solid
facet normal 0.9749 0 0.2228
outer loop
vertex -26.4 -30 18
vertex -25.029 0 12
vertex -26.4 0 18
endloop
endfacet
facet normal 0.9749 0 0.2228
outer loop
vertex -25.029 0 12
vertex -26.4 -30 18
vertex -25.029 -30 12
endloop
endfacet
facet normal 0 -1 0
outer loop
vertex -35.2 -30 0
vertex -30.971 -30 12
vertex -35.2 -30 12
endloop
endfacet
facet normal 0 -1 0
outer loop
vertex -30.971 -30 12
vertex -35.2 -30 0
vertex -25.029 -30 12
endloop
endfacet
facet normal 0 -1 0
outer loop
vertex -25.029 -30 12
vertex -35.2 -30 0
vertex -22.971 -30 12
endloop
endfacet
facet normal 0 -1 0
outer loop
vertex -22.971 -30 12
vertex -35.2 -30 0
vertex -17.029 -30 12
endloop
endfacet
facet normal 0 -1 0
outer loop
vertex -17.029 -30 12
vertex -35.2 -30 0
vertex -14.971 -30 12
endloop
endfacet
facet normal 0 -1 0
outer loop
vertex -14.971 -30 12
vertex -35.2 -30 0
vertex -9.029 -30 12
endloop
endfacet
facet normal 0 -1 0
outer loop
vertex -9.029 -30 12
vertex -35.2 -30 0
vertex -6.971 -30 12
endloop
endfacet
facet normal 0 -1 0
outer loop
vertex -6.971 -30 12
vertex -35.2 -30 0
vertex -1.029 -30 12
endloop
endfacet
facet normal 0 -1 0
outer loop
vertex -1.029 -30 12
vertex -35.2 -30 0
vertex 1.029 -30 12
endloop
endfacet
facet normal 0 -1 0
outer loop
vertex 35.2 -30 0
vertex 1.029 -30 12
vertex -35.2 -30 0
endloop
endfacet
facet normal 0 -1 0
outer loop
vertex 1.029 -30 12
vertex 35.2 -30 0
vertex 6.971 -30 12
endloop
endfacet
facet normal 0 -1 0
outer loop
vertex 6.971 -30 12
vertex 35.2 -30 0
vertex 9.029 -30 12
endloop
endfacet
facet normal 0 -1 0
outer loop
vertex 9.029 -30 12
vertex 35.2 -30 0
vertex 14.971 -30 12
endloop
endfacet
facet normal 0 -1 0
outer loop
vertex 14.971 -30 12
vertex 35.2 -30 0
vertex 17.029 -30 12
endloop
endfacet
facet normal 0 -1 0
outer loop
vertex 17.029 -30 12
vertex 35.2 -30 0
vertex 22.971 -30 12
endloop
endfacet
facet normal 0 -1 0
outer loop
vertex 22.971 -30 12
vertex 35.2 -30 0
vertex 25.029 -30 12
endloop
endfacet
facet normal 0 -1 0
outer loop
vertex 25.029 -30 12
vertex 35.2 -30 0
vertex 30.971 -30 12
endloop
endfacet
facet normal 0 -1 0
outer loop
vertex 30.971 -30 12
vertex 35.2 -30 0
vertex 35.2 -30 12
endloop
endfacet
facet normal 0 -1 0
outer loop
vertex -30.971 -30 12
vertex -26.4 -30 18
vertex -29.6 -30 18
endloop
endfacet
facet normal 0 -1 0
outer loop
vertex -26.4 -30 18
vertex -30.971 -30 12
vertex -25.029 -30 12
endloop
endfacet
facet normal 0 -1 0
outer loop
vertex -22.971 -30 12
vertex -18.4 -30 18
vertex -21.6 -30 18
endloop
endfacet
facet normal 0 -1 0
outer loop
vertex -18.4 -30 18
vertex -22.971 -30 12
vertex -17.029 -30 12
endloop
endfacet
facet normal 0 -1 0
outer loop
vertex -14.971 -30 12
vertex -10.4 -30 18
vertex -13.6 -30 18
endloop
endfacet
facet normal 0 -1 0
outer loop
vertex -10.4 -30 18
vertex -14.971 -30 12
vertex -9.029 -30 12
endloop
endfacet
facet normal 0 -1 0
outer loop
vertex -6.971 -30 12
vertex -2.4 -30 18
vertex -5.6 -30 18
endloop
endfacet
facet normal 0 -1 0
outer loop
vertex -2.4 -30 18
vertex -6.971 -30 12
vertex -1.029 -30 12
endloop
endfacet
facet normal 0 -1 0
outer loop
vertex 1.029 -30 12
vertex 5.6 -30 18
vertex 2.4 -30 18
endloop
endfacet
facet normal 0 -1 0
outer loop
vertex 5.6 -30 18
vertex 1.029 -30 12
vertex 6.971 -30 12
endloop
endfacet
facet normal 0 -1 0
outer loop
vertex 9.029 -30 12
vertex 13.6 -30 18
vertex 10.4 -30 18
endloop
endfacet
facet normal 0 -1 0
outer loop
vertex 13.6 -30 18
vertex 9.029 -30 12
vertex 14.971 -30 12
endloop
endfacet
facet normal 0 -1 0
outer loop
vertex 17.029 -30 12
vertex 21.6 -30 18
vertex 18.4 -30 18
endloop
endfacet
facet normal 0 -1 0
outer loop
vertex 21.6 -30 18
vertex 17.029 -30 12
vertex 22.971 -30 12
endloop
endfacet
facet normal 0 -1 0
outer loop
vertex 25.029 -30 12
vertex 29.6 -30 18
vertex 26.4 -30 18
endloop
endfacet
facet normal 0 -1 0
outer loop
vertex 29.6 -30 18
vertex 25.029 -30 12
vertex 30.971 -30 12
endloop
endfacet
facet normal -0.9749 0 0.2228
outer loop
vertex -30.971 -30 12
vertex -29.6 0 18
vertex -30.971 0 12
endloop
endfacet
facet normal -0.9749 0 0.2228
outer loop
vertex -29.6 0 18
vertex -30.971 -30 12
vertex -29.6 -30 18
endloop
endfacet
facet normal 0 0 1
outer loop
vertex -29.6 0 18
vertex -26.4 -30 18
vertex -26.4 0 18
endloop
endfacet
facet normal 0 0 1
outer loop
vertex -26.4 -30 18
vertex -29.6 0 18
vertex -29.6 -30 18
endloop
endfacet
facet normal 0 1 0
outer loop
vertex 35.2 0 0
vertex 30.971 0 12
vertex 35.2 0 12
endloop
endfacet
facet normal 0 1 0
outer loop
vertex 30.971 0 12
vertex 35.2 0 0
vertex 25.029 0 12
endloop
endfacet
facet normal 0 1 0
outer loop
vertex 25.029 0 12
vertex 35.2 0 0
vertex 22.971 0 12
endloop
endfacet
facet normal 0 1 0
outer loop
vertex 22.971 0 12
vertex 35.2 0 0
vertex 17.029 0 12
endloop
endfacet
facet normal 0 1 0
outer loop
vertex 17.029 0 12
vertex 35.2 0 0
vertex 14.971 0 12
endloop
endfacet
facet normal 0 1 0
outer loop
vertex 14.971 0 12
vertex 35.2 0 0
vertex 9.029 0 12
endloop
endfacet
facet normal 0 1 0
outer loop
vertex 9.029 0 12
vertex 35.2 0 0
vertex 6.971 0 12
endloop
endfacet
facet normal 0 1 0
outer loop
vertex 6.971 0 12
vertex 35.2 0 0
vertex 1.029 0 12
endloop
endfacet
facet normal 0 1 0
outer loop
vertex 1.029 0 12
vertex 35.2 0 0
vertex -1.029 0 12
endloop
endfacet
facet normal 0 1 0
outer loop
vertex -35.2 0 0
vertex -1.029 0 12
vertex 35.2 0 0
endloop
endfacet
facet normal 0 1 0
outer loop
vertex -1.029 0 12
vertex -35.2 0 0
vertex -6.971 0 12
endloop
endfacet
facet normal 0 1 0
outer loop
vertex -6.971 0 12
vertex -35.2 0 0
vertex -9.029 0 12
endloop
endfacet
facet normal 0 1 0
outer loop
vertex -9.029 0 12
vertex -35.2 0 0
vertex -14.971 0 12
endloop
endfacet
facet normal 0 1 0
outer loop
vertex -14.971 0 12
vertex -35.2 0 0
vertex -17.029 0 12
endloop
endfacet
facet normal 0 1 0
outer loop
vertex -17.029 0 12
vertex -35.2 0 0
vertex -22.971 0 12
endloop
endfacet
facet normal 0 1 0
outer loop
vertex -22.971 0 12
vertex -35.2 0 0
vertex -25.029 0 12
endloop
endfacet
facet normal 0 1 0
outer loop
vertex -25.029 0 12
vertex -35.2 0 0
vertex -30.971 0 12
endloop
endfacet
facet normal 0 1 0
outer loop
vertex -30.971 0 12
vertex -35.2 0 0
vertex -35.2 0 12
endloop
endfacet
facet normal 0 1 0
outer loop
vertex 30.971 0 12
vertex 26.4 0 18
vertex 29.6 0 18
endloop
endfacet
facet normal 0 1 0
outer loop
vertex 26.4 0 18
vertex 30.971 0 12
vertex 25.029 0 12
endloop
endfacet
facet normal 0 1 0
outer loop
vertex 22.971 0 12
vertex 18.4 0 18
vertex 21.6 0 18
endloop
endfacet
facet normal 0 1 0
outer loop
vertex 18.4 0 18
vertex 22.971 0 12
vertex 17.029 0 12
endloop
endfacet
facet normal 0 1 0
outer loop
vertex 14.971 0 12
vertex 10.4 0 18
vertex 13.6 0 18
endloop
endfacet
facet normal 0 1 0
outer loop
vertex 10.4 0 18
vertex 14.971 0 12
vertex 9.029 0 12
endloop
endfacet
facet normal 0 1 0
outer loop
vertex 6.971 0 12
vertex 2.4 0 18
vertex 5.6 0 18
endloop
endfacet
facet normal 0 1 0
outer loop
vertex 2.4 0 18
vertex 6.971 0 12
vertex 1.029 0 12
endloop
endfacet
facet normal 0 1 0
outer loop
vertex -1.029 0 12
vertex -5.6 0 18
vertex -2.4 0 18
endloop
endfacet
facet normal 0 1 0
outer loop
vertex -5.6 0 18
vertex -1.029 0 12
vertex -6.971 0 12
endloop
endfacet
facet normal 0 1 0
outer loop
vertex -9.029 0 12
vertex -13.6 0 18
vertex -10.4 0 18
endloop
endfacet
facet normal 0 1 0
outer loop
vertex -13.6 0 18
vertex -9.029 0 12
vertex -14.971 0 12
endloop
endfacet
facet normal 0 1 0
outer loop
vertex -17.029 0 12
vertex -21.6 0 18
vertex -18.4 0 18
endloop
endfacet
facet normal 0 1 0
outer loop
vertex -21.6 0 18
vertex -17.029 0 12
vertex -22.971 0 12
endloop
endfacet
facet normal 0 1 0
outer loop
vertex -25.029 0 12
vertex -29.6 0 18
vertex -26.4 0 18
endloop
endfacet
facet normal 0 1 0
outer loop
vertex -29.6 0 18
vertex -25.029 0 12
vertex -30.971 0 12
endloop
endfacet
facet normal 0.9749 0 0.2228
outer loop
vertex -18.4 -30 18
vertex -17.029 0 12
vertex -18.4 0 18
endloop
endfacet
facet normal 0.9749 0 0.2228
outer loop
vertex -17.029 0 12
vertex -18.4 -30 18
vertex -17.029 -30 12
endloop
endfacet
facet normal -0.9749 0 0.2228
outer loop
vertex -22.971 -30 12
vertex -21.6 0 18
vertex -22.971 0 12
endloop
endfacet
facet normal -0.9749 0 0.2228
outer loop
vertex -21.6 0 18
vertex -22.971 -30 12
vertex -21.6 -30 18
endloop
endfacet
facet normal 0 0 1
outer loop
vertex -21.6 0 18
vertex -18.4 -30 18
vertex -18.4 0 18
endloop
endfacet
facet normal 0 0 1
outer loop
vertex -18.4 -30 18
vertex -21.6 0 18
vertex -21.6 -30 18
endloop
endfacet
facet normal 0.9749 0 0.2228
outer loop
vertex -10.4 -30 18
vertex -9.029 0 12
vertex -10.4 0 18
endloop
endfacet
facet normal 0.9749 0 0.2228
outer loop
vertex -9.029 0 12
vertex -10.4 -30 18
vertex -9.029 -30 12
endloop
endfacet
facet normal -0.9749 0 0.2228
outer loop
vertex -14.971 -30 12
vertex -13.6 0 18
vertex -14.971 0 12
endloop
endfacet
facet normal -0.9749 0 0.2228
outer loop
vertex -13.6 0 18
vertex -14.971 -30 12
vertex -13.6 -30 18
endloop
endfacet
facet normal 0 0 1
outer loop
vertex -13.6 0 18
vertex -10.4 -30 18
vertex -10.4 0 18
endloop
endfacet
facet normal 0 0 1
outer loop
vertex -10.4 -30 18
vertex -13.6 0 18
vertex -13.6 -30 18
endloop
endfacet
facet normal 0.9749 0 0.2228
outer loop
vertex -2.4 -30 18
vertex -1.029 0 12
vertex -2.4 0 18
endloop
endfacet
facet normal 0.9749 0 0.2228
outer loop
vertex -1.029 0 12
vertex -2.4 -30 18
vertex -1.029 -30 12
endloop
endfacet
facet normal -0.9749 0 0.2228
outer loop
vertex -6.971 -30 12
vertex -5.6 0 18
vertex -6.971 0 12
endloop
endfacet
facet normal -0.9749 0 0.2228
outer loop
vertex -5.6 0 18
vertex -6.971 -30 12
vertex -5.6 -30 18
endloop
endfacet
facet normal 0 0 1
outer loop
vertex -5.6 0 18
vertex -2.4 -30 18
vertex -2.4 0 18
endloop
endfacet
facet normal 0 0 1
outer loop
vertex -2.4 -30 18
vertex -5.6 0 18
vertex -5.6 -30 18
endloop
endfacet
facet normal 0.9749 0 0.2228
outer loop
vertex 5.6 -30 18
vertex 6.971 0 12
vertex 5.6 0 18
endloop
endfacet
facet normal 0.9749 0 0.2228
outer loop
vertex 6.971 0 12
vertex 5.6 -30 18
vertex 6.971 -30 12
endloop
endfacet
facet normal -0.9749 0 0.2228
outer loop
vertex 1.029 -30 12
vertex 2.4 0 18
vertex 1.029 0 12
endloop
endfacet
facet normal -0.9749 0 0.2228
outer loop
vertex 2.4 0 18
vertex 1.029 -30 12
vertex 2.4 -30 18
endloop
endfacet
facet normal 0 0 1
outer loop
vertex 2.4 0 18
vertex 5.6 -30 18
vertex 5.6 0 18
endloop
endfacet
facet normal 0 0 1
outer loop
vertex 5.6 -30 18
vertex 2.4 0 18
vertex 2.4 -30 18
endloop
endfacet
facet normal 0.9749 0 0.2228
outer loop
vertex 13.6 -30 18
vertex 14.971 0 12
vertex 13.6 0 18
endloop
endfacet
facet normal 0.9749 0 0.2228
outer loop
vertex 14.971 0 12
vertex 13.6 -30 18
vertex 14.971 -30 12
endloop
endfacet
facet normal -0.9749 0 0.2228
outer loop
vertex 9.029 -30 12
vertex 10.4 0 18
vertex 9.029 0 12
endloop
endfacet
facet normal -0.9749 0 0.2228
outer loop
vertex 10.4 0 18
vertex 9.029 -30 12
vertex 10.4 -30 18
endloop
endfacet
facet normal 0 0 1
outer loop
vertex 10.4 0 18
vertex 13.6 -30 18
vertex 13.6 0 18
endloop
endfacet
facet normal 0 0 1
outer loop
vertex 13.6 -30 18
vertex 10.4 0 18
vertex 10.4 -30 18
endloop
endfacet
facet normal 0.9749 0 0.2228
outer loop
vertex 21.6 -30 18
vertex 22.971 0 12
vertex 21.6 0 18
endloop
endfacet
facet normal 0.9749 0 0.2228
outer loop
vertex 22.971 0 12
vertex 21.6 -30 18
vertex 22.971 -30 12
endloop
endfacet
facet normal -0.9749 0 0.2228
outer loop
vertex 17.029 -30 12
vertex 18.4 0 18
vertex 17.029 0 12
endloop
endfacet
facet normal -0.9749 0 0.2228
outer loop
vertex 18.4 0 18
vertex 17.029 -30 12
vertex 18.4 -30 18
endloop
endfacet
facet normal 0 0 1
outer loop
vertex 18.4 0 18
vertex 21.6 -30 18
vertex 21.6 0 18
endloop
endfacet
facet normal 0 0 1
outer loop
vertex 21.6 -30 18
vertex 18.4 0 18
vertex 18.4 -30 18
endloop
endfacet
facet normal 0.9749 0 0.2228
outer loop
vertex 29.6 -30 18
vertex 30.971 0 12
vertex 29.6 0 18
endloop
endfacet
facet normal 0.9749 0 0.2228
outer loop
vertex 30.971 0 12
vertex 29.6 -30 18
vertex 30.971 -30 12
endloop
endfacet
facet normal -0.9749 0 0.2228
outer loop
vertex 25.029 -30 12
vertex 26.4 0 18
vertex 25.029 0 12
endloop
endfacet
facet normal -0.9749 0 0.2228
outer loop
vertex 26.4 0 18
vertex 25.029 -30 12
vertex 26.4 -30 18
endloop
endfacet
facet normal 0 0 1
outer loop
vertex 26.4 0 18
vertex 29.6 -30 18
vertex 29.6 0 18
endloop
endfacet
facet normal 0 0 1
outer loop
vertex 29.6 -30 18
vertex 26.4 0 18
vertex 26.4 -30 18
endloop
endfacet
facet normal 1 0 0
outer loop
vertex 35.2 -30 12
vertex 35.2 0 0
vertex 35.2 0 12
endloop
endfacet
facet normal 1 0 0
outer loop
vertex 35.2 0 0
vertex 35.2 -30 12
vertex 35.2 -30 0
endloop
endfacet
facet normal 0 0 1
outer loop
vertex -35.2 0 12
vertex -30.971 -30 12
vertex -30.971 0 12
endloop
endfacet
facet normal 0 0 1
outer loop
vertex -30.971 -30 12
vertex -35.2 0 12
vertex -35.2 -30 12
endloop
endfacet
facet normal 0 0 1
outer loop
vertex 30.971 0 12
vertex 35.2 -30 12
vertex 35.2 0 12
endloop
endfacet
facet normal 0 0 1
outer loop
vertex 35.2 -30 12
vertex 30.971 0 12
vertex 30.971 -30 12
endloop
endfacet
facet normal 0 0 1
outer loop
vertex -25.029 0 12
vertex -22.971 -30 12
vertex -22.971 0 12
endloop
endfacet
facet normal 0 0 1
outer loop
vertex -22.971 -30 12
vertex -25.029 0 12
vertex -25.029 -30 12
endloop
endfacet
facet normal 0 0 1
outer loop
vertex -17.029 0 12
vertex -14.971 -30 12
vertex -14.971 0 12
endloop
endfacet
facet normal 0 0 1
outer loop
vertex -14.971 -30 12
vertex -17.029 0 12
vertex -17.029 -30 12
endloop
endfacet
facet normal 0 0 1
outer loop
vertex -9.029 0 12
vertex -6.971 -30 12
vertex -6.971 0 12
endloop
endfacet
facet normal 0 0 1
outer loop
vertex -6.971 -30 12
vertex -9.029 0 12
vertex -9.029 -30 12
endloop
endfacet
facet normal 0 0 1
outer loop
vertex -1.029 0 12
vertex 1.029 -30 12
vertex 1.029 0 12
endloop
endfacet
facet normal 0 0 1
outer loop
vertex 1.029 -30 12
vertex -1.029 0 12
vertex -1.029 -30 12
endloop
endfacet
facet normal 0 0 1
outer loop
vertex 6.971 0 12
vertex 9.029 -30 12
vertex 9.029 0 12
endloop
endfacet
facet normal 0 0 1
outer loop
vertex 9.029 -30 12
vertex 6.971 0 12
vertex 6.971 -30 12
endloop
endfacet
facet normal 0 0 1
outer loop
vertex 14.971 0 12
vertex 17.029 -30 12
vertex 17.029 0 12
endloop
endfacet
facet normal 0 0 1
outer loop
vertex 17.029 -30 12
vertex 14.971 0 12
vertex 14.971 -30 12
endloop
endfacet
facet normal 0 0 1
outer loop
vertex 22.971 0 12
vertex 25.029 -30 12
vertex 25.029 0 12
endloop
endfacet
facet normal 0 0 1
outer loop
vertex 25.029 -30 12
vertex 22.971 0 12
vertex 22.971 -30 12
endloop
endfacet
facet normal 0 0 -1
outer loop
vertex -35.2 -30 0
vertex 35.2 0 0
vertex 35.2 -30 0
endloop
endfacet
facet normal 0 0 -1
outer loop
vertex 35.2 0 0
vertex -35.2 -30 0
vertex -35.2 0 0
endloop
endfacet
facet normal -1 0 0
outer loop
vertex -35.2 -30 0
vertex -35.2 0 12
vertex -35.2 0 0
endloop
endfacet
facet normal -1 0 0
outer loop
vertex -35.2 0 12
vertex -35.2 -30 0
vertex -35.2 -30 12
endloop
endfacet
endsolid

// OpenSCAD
$fn = 32;

// ----------------------------------------------------------------------
// Toothed rack, 8 teeth
// 8 mm pitch, 6 mm teeth
// ----------------------------------------------------------------------

// --- parameters (mm) ---
bar_w = 30;     // bar width (Y)
bar_h = 12;     // bar height (Z)
teeth = 8;      // number of teeth
pitch = 8;      // tooth pitch
tooth_h = 6;    // tooth height above the bar
root_w = 6.4;   // tooth width at the root
crest_w = 3.2;  // tooth width at the crest

// --- derived feature positions (mm) ---
span = (teeth - 1) * pitch;  // = 56   distance between the outer teeth
bar_l = span + root_w + 8;   // = 70.4   bar length: teeth plus 4 mm at each end
tooth_x = -span / 2;         // = -28   X of the first tooth
height = bar_h + tooth_h;    // = 18   overall height
feature_centers = [
  [tooth_x + 0 * pitch, -bar_w / 2],
  [tooth_x + 1 * pitch, -bar_w / 2],
  [tooth_x + 2 * pitch, -bar_w / 2],
  [tooth_x + 3 * pitch, -bar_w / 2],
  [tooth_x + 4 * pitch, -bar_w / 2],
  [tooth_x + 5 * pitch, -bar_w / 2],
  [tooth_x + 6 * pitch, -bar_w / 2],
  [tooth_x + 7 * pitch, -bar_w / 2]
];   // tooth centre line, drives the tooth loop

// bar with a rack of teeth, one extruded trapezoium per centre
module rack_tooth() {
  linear_extrude(height = bar_w)
    polygon(points = [
      [0, 0],
      [root_w, 0],
      [root_w / 2 + crest_w / 2, tooth_h + 1],
      [root_w / 2 - crest_w / 2, tooth_h + 1]
    ]);
}

union() {
  translate([-bar_l / 2, -bar_w, 0]) cube([bar_l, bar_w, bar_h]);
  for (centre = feature_centers)
    translate([centre[0] - root_w / 2, 0, bar_h - 1]) rotate([90, 0, 0]) rack_tooth();
}
